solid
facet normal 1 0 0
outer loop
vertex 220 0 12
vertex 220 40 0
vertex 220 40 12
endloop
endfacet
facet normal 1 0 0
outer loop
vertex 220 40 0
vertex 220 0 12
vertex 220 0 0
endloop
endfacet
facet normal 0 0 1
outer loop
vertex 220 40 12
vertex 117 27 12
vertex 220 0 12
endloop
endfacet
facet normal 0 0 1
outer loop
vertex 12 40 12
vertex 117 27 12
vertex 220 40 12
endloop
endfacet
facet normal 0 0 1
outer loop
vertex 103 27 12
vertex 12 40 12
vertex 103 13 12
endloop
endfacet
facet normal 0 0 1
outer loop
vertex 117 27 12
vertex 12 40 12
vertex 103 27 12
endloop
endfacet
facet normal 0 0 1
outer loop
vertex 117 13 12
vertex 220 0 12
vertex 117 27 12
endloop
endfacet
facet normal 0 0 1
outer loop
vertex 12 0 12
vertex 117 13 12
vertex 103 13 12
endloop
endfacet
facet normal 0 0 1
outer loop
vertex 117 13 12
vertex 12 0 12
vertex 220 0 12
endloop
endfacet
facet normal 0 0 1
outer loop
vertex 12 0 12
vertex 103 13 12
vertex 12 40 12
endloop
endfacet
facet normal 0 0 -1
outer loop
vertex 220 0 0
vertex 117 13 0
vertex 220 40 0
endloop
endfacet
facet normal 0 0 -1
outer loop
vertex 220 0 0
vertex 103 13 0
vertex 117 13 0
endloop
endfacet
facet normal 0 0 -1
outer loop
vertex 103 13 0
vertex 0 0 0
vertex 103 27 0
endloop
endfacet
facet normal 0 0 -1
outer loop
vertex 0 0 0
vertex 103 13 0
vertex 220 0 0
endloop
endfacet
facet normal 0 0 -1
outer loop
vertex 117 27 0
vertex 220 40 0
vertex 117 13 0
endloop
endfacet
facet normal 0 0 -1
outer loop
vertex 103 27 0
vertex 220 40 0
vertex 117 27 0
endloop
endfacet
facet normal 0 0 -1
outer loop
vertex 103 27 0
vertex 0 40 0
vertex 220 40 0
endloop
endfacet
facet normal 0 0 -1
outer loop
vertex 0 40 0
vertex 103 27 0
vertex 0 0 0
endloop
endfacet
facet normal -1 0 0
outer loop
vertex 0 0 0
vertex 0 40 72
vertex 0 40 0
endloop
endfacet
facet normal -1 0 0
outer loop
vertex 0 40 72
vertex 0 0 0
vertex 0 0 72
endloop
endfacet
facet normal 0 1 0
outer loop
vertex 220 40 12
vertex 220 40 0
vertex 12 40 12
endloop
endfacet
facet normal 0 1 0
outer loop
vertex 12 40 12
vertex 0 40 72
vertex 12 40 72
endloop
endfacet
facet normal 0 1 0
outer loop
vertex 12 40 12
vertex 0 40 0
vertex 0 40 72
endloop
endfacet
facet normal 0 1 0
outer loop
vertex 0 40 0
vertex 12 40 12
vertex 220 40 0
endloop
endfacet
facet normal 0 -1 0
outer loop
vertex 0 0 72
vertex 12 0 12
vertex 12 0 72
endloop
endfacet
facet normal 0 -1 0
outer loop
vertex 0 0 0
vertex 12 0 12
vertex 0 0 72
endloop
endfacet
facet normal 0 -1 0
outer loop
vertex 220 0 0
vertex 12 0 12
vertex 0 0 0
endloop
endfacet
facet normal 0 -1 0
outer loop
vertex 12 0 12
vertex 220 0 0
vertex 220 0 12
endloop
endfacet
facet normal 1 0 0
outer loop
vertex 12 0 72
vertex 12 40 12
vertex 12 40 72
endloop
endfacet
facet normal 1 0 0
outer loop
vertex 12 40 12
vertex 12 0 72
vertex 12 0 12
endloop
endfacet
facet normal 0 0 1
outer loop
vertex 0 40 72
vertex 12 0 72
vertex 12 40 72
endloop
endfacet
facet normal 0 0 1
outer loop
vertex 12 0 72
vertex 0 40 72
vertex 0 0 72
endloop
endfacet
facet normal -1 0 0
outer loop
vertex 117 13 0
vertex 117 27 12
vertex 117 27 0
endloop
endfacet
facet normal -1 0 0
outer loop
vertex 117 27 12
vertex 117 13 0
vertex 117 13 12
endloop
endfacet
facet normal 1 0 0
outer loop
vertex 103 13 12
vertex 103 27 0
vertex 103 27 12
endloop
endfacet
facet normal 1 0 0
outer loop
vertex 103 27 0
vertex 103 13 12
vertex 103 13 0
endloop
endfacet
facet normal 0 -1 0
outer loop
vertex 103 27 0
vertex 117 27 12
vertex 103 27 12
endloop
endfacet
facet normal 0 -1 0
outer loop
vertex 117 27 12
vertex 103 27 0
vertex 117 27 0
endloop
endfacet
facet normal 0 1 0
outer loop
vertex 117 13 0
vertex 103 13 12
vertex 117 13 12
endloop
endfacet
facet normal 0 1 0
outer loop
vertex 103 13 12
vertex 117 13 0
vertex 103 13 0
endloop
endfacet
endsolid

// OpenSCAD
$fn = 32;

// ----------------------------------------------------------------------
// Gantry bracket: 200-250 mm L bracket
// ----------------------------------------------------------------------

// --- parameters (mm) ---
base_l = 220;             // base arm length, X
arm_w = 40;               // arm width, Y
thick = 12;               // arm thickness
up_h = 60;                // vertical arm height, Z
slot_w = 14;              // adjustment slot width in the base

total_h = up_h + thick;  // overall height

difference() {
  union() {
    cube([base_l, arm_w, thick]);
    cube([thick, arm_w, total_h]);
  }
  translate([base_l / 2 - slot_w / 2, arm_w / 2 - slot_w / 2, -1])
    cube([slot_w, slot_w, thick + 2]);
}
